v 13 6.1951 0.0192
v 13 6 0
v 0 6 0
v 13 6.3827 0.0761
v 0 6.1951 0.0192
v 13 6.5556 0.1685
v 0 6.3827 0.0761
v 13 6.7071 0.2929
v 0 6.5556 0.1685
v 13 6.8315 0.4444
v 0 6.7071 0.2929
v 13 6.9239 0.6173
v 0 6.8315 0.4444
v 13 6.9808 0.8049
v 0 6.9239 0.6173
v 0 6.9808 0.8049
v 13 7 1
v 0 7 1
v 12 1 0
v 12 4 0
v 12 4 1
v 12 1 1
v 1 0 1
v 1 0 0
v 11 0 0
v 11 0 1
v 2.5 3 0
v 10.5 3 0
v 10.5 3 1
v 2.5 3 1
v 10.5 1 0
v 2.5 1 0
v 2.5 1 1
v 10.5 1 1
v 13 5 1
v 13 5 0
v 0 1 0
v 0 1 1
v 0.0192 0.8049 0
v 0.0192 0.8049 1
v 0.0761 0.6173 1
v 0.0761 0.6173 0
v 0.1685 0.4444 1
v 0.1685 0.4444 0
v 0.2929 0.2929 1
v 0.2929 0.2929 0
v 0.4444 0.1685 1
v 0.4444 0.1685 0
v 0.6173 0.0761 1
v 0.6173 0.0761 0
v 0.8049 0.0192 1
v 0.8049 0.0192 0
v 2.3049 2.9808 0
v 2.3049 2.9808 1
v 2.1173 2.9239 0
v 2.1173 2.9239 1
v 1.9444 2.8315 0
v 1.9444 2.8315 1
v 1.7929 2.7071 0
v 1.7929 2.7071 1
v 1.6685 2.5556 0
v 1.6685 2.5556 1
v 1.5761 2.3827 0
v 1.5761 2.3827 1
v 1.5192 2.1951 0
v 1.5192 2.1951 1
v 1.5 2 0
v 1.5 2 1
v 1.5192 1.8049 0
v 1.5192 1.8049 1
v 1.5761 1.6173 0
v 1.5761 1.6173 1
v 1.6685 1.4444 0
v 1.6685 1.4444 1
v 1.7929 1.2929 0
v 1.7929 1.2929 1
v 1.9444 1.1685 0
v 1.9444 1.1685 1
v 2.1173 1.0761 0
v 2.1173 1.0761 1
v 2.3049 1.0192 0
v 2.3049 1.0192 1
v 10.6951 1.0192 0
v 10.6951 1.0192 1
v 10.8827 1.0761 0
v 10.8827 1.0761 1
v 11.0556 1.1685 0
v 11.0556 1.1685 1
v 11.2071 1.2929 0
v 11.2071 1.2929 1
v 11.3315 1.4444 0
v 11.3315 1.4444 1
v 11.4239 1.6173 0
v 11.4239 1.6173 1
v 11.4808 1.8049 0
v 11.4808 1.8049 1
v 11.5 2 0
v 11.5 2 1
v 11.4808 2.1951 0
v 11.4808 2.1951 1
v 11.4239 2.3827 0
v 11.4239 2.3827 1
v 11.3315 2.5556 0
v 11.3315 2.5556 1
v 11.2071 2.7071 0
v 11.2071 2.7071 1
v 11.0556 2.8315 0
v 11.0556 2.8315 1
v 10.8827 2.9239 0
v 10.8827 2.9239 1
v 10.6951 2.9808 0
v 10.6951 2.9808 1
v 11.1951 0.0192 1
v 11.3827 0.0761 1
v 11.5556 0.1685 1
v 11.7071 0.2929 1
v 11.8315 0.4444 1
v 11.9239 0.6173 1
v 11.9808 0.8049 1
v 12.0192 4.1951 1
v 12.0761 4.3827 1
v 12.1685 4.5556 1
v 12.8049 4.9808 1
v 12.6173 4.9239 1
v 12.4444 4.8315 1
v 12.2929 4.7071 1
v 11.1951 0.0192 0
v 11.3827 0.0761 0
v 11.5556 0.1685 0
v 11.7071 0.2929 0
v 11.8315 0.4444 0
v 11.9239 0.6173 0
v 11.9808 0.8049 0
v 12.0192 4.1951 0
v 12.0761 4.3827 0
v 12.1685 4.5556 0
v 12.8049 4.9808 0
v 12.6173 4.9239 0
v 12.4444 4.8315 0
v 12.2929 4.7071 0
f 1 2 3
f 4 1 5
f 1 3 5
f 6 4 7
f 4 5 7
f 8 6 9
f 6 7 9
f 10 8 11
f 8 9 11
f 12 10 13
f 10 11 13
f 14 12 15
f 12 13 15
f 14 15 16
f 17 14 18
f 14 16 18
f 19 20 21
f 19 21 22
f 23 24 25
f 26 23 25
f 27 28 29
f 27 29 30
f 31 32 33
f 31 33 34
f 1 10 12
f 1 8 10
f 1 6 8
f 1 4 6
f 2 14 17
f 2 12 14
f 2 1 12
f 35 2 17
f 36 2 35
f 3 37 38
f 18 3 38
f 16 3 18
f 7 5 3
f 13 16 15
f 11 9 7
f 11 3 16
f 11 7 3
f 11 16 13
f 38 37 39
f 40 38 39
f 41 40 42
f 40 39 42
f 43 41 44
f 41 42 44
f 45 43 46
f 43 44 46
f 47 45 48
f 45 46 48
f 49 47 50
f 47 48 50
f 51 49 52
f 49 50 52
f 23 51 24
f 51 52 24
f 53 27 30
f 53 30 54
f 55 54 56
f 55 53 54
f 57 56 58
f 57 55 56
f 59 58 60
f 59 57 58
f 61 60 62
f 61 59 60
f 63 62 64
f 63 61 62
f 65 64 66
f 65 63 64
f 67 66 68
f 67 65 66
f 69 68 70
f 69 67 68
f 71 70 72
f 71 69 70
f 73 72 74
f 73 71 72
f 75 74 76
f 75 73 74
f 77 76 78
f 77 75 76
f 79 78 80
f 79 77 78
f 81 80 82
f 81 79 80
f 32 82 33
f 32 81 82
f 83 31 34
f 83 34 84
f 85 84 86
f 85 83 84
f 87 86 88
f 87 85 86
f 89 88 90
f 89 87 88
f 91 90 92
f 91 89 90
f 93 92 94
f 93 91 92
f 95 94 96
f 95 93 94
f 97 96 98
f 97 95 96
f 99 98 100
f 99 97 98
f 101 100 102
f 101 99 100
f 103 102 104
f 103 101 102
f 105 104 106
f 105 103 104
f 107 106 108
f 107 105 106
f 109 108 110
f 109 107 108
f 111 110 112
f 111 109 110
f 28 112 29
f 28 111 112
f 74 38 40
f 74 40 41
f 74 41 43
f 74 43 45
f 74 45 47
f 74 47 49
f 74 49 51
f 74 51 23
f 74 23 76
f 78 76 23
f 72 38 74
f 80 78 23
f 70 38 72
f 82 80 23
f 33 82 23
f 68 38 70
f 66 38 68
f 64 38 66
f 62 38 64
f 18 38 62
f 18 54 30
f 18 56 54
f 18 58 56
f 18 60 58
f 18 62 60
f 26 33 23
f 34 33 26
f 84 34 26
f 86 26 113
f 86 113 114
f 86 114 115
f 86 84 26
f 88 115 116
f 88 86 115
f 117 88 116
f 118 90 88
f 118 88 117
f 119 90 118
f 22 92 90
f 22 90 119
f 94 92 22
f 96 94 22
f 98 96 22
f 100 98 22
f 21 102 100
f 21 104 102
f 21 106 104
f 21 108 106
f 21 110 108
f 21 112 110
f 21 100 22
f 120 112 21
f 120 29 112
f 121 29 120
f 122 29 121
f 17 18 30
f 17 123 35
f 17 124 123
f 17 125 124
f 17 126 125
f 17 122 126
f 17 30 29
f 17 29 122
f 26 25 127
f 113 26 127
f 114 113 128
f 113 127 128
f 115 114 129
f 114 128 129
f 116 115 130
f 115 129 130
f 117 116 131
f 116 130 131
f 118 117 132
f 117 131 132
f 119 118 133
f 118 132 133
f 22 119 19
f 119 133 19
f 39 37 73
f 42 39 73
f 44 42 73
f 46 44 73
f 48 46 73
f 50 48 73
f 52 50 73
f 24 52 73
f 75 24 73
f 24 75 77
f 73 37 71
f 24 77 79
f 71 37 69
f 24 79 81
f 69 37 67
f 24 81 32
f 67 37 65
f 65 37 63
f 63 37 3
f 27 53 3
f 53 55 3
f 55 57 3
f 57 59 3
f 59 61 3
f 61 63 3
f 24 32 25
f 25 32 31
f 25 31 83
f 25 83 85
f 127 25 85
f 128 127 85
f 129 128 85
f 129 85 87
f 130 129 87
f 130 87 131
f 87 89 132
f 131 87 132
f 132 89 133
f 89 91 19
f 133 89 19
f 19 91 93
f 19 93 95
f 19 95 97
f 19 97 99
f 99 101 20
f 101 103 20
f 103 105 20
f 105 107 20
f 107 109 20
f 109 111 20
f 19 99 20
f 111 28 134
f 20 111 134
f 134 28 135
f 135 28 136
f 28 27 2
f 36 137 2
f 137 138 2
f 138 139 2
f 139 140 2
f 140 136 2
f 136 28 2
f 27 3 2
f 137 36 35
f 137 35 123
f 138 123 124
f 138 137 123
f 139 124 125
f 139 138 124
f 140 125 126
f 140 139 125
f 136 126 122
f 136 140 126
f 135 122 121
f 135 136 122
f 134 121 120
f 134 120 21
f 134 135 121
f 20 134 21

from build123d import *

# Parameters (mm, degrees)
EXTRUDE072_DEPTH = 15
EXTRUDE068_DEPTH = 1
EXTRUDE067_DEPTH = 1


with BuildPart() as extrude072:
    # Sketch269 → Extrude072 (new body)
    with BuildSketch(Plane.YZ):
        with BuildLine():
            ThreePointArc((6, 0), (6.707107, 0.292893), (7, 1))
            Line((7, 1), (7, 0))
            Line((6, 0), (7, 0))
        make_face()
    extrude(amount=EXTRUDE072_DEPTH)


with BuildPart() as extrude068:
    # Sketch265 → Extrude068 (new body)
    with BuildSketch(Plane.XY):
        with BuildLine():
            ThreePointArc((10.5, 1), (11.5, 2), (10.5, 3))
            Line((10.5, 3), (2.5, 3))
            ThreePointArc((2.5, 3), (1.5, 2), (2.5, 1))
            Line((2.5, 1), (10.5, 1))
        make_face()
    extrude(amount=EXTRUDE068_DEPTH)


with BuildPart() as cut043:
    # Sketch264 → Extrude067 (new body)
    with BuildSketch(Plane.XY):
        with BuildLine():
            ThreePointArc((0, 1), (0.292893, 0.292893), (1, 0))
            Line((1, 0), (11, 0))
            ThreePointArc((11, 0), (11.707107, 0.292893), (12, 1))
            Line((12, 4), (12, 1))
            ThreePointArc((13, 5), (12.292893, 4.707107), (12, 4))
            Line((13, 7), (13, 5))
            Line((0, 7), (13, 7))
            Line((0, 1), (0, 7))
        make_face()
    extrude(amount=EXTRUDE067_DEPTH)

    # Cut040: cut Extrude068
    add(extrude068.part, mode=Mode.SUBTRACT)

    # Cut043: cut Extrude072
    add(extrude072.part, mode=Mode.SUBTRACT)


solid = cut043.part
